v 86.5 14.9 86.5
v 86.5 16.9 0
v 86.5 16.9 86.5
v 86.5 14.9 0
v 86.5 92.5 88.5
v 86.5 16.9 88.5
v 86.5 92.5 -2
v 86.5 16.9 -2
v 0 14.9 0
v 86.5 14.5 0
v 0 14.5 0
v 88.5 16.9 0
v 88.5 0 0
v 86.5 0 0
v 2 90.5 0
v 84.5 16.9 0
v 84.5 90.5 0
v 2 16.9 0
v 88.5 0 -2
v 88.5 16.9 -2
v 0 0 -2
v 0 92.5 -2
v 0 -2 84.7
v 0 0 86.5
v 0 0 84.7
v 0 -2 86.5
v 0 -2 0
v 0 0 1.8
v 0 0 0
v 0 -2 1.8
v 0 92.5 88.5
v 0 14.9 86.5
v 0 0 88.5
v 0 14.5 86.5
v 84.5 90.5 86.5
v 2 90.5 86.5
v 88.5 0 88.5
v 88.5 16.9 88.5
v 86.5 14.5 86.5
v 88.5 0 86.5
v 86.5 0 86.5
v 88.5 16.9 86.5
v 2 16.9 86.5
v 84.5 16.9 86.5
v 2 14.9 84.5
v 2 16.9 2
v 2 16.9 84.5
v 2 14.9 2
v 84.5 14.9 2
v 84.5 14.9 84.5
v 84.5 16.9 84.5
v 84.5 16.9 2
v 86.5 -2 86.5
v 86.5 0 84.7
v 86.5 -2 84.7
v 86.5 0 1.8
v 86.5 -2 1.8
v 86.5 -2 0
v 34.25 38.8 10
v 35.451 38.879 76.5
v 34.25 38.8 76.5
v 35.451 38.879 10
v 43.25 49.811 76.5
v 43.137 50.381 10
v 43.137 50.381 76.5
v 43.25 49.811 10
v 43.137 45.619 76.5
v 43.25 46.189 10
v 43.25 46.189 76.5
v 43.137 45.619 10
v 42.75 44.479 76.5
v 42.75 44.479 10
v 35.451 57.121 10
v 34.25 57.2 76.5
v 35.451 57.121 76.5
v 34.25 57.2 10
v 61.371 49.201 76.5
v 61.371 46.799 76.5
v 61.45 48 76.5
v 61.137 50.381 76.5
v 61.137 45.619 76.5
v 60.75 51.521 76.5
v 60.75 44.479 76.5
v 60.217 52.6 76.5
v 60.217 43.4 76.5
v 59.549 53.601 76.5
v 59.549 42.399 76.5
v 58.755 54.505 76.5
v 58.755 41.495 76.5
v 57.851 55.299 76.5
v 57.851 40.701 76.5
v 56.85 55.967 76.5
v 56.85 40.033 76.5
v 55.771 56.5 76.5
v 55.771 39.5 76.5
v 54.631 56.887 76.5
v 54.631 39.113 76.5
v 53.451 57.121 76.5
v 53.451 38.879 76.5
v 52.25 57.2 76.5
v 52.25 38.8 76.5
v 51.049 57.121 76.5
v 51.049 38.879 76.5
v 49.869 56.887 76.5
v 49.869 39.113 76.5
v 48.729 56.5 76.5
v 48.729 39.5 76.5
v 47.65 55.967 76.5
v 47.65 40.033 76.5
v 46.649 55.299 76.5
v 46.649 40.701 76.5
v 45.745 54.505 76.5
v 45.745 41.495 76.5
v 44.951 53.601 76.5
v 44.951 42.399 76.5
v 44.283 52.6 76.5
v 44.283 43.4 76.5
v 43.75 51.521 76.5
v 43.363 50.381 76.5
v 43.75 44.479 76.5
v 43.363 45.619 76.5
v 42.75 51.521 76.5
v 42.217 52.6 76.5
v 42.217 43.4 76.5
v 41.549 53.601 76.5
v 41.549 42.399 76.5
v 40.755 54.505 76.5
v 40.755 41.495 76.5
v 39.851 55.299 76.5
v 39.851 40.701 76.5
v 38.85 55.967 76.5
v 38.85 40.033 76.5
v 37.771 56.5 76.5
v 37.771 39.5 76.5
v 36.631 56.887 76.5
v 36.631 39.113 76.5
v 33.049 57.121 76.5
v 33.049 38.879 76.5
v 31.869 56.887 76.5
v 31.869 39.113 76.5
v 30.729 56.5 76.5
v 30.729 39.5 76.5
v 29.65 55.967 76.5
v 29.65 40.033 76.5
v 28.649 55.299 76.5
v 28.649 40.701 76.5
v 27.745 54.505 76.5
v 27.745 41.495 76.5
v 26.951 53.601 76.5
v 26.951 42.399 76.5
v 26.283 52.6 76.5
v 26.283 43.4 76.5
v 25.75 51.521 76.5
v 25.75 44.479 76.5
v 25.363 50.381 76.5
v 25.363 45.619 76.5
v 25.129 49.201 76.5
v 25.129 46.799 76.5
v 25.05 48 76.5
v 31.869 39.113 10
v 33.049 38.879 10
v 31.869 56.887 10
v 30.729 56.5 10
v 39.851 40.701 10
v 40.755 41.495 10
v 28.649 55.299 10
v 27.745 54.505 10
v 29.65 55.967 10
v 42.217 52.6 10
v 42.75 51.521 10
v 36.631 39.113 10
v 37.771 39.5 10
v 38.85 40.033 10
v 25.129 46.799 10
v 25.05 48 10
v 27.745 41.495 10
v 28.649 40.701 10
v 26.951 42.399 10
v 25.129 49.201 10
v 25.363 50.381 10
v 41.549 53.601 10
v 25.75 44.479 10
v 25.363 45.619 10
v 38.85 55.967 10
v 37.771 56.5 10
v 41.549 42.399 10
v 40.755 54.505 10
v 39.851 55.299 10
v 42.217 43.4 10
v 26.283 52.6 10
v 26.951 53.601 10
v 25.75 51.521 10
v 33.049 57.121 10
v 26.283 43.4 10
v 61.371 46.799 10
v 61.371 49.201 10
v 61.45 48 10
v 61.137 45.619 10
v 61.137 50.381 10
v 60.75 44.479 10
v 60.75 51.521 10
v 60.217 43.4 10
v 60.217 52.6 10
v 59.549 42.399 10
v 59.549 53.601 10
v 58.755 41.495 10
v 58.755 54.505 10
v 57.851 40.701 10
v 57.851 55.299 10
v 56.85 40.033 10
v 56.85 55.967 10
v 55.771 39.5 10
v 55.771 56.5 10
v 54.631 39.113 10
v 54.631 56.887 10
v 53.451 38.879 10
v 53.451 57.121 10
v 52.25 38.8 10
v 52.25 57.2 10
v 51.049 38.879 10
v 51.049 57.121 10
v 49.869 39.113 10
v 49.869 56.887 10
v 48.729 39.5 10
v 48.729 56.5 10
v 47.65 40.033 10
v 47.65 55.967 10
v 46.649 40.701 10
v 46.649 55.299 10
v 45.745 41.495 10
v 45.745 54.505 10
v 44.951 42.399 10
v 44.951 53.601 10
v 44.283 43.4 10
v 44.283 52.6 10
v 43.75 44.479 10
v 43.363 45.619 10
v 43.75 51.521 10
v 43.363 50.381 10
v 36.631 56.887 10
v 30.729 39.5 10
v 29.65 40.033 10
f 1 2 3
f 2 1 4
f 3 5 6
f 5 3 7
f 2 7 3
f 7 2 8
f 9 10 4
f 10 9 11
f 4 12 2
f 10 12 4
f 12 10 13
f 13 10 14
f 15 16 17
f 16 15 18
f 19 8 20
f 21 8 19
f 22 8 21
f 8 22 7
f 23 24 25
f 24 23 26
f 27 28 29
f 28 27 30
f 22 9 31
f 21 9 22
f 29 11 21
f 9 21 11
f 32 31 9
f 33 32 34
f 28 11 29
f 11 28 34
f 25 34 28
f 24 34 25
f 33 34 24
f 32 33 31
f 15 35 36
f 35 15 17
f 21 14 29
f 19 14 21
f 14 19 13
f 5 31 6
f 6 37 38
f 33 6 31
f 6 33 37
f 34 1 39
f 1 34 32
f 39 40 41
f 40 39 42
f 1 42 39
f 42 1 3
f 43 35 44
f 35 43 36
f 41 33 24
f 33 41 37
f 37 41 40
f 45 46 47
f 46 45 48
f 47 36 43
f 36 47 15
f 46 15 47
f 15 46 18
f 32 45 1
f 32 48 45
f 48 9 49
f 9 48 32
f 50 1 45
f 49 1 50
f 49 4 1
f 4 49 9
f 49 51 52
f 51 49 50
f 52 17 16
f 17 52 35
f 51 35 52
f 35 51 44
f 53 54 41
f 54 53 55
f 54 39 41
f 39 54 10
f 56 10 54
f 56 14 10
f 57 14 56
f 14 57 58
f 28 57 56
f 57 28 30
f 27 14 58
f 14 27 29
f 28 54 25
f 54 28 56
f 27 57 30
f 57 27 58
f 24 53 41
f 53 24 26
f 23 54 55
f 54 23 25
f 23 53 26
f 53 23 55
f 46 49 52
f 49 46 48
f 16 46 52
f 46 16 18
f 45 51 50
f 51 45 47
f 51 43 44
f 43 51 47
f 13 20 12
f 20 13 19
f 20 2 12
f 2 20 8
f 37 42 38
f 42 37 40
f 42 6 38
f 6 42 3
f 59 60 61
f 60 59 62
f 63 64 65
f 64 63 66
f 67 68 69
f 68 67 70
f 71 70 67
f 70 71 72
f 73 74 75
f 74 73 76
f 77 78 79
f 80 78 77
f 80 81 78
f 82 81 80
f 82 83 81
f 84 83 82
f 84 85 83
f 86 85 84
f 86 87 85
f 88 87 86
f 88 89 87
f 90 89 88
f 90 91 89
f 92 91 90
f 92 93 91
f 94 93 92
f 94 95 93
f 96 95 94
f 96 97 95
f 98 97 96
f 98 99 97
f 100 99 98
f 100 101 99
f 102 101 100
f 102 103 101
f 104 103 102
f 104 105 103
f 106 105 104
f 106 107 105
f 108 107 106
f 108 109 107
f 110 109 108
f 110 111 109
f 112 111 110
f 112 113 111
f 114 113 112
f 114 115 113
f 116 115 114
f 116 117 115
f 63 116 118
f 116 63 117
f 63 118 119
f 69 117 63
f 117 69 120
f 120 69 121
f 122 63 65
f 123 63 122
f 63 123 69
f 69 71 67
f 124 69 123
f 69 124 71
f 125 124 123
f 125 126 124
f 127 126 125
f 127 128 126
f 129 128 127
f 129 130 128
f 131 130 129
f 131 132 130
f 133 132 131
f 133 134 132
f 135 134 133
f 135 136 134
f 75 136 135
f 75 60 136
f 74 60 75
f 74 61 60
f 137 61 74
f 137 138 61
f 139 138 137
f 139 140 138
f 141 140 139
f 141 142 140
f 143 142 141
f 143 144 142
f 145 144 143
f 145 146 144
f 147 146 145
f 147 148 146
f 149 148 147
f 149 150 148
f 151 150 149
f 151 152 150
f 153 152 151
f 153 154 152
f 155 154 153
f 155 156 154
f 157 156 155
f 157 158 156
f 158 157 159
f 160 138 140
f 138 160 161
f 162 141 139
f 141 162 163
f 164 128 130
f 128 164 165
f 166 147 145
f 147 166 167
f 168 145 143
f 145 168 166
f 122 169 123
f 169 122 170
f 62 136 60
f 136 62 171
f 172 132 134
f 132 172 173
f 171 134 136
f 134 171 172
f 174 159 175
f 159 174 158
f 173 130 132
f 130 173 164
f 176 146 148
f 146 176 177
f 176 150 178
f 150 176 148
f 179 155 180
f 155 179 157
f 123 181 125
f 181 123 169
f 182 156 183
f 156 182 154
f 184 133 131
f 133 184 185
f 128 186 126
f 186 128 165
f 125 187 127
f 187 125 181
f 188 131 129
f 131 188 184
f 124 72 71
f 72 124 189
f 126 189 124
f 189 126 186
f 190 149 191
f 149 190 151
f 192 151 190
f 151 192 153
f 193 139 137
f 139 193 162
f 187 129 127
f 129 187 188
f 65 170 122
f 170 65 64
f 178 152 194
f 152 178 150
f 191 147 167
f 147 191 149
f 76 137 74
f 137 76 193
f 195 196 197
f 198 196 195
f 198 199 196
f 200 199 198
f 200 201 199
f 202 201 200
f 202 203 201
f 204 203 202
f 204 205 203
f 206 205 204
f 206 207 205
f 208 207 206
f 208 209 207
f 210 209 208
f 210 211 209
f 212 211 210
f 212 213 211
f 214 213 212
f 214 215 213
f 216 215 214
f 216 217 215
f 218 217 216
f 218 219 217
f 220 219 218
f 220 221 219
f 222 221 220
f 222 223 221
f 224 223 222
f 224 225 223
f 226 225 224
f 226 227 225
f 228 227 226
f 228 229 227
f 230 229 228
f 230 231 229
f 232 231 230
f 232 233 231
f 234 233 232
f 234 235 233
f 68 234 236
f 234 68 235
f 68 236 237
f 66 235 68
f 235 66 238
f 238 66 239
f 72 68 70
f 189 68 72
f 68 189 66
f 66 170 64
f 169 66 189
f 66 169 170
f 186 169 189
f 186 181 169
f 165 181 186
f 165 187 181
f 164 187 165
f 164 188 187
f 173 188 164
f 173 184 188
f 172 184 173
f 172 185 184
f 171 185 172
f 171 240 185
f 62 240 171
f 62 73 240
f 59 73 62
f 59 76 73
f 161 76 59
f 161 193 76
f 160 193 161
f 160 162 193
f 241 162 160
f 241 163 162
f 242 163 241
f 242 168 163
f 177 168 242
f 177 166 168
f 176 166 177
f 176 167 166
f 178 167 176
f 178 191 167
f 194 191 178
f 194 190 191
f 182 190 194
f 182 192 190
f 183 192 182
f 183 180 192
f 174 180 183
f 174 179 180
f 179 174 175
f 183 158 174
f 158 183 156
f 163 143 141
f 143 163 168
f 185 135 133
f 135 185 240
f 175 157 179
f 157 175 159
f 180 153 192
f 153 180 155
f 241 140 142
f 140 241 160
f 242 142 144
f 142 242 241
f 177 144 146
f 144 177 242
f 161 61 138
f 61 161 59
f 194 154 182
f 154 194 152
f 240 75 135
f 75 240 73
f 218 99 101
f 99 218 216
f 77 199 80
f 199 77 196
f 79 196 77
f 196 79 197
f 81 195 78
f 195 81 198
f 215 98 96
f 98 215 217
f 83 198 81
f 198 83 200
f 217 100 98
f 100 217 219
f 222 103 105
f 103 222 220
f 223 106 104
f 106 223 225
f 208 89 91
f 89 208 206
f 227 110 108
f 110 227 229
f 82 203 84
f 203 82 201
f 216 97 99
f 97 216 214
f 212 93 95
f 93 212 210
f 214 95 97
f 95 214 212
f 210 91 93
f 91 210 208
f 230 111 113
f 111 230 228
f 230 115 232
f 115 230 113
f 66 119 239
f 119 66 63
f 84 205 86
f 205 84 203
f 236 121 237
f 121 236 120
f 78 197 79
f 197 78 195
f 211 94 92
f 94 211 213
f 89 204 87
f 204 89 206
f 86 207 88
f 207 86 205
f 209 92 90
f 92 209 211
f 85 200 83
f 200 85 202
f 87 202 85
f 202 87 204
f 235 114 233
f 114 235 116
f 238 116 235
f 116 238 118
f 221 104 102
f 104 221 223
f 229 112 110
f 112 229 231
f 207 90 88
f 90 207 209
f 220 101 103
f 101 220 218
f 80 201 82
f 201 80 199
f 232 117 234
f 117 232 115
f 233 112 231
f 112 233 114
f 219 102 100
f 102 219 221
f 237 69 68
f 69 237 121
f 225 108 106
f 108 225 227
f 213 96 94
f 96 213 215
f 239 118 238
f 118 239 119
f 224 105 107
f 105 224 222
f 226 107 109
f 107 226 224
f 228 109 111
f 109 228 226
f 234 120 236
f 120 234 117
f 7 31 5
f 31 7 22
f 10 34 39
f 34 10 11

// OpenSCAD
// FlipPomodoroTimer enclosure concept V0, units mm.
// NOT a final printable fit. Panel includes its existing factory housing.
panel_w = 86.5;
panel_h = 86.5;
panel_d = 14.5;
slide_clearance = 0.4;
wall = 2;
body_depth = 90.5;
right_guard = 2;
show_panel = true;
show_battery = true;
show_lid = true;
explode_lid = 0;

// X left/right facing screen; Y front->rear; Z bottom->top.
module part(x,y,z,w,d,h) { translate([x,y,z]) cube([w,d,h]); }
module shell() {
  slot_back = panel_d + slide_clearance;
  // Front slot goes completely through X: no left/right front sidewalls.
  part(0,0,-wall,panel_w,body_depth,wall);
  part(0,0,panel_h,panel_w,body_depth,wall);
  part(0,slot_back,0,wall,body_depth-slot_back,panel_h);
  part(panel_w-wall,slot_back,0,wall,body_depth-slot_back,panel_h);
  // Front lips touch only bezel; rear shoulders locate panel in depth.
  part(0,-wall,0,panel_w,wall,1.8);
  part(0,-wall,panel_h-1.8,panel_w,wall,1.8);
  part(0,slot_back,0,panel_w,wall,2);
  part(0,slot_back,panel_h-2,panel_w,wall,2);
  // Two outboard feet protect buttons without covering buttons/USB.
  part(panel_w,0,-wall,right_guard,slot_back+wall,wall);
  part(panel_w,0,panel_h,right_guard,slot_back+wall,wall);
}
module rear_lid() {
  // Screw attachment, speaker openings and wire routing remain unfinalized.
  part(0,body_depth+explode_lid,-wall,panel_w,wall,panel_h+2*wall);
}
module panel_reference() { part(0,0,0,panel_w,panel_d,panel_h); }
module battery_reference() {
  // Earlier listing envelope only, replace with measured pack when delivered.
  translate([panel_w/2-9,48,10]) cylinder(h=66.5,r=9.2,$fn=48);
  translate([panel_w/2+9,48,10]) cylinder(h=66.5,r=9.2,$fn=48);
}
color("ivory") shell();
if (show_lid) color("ivory") rear_lid();
if (show_panel) color([.08,.10,.12]) panel_reference();
if (show_battery) color([.12,.38,.78]) battery_reference();
